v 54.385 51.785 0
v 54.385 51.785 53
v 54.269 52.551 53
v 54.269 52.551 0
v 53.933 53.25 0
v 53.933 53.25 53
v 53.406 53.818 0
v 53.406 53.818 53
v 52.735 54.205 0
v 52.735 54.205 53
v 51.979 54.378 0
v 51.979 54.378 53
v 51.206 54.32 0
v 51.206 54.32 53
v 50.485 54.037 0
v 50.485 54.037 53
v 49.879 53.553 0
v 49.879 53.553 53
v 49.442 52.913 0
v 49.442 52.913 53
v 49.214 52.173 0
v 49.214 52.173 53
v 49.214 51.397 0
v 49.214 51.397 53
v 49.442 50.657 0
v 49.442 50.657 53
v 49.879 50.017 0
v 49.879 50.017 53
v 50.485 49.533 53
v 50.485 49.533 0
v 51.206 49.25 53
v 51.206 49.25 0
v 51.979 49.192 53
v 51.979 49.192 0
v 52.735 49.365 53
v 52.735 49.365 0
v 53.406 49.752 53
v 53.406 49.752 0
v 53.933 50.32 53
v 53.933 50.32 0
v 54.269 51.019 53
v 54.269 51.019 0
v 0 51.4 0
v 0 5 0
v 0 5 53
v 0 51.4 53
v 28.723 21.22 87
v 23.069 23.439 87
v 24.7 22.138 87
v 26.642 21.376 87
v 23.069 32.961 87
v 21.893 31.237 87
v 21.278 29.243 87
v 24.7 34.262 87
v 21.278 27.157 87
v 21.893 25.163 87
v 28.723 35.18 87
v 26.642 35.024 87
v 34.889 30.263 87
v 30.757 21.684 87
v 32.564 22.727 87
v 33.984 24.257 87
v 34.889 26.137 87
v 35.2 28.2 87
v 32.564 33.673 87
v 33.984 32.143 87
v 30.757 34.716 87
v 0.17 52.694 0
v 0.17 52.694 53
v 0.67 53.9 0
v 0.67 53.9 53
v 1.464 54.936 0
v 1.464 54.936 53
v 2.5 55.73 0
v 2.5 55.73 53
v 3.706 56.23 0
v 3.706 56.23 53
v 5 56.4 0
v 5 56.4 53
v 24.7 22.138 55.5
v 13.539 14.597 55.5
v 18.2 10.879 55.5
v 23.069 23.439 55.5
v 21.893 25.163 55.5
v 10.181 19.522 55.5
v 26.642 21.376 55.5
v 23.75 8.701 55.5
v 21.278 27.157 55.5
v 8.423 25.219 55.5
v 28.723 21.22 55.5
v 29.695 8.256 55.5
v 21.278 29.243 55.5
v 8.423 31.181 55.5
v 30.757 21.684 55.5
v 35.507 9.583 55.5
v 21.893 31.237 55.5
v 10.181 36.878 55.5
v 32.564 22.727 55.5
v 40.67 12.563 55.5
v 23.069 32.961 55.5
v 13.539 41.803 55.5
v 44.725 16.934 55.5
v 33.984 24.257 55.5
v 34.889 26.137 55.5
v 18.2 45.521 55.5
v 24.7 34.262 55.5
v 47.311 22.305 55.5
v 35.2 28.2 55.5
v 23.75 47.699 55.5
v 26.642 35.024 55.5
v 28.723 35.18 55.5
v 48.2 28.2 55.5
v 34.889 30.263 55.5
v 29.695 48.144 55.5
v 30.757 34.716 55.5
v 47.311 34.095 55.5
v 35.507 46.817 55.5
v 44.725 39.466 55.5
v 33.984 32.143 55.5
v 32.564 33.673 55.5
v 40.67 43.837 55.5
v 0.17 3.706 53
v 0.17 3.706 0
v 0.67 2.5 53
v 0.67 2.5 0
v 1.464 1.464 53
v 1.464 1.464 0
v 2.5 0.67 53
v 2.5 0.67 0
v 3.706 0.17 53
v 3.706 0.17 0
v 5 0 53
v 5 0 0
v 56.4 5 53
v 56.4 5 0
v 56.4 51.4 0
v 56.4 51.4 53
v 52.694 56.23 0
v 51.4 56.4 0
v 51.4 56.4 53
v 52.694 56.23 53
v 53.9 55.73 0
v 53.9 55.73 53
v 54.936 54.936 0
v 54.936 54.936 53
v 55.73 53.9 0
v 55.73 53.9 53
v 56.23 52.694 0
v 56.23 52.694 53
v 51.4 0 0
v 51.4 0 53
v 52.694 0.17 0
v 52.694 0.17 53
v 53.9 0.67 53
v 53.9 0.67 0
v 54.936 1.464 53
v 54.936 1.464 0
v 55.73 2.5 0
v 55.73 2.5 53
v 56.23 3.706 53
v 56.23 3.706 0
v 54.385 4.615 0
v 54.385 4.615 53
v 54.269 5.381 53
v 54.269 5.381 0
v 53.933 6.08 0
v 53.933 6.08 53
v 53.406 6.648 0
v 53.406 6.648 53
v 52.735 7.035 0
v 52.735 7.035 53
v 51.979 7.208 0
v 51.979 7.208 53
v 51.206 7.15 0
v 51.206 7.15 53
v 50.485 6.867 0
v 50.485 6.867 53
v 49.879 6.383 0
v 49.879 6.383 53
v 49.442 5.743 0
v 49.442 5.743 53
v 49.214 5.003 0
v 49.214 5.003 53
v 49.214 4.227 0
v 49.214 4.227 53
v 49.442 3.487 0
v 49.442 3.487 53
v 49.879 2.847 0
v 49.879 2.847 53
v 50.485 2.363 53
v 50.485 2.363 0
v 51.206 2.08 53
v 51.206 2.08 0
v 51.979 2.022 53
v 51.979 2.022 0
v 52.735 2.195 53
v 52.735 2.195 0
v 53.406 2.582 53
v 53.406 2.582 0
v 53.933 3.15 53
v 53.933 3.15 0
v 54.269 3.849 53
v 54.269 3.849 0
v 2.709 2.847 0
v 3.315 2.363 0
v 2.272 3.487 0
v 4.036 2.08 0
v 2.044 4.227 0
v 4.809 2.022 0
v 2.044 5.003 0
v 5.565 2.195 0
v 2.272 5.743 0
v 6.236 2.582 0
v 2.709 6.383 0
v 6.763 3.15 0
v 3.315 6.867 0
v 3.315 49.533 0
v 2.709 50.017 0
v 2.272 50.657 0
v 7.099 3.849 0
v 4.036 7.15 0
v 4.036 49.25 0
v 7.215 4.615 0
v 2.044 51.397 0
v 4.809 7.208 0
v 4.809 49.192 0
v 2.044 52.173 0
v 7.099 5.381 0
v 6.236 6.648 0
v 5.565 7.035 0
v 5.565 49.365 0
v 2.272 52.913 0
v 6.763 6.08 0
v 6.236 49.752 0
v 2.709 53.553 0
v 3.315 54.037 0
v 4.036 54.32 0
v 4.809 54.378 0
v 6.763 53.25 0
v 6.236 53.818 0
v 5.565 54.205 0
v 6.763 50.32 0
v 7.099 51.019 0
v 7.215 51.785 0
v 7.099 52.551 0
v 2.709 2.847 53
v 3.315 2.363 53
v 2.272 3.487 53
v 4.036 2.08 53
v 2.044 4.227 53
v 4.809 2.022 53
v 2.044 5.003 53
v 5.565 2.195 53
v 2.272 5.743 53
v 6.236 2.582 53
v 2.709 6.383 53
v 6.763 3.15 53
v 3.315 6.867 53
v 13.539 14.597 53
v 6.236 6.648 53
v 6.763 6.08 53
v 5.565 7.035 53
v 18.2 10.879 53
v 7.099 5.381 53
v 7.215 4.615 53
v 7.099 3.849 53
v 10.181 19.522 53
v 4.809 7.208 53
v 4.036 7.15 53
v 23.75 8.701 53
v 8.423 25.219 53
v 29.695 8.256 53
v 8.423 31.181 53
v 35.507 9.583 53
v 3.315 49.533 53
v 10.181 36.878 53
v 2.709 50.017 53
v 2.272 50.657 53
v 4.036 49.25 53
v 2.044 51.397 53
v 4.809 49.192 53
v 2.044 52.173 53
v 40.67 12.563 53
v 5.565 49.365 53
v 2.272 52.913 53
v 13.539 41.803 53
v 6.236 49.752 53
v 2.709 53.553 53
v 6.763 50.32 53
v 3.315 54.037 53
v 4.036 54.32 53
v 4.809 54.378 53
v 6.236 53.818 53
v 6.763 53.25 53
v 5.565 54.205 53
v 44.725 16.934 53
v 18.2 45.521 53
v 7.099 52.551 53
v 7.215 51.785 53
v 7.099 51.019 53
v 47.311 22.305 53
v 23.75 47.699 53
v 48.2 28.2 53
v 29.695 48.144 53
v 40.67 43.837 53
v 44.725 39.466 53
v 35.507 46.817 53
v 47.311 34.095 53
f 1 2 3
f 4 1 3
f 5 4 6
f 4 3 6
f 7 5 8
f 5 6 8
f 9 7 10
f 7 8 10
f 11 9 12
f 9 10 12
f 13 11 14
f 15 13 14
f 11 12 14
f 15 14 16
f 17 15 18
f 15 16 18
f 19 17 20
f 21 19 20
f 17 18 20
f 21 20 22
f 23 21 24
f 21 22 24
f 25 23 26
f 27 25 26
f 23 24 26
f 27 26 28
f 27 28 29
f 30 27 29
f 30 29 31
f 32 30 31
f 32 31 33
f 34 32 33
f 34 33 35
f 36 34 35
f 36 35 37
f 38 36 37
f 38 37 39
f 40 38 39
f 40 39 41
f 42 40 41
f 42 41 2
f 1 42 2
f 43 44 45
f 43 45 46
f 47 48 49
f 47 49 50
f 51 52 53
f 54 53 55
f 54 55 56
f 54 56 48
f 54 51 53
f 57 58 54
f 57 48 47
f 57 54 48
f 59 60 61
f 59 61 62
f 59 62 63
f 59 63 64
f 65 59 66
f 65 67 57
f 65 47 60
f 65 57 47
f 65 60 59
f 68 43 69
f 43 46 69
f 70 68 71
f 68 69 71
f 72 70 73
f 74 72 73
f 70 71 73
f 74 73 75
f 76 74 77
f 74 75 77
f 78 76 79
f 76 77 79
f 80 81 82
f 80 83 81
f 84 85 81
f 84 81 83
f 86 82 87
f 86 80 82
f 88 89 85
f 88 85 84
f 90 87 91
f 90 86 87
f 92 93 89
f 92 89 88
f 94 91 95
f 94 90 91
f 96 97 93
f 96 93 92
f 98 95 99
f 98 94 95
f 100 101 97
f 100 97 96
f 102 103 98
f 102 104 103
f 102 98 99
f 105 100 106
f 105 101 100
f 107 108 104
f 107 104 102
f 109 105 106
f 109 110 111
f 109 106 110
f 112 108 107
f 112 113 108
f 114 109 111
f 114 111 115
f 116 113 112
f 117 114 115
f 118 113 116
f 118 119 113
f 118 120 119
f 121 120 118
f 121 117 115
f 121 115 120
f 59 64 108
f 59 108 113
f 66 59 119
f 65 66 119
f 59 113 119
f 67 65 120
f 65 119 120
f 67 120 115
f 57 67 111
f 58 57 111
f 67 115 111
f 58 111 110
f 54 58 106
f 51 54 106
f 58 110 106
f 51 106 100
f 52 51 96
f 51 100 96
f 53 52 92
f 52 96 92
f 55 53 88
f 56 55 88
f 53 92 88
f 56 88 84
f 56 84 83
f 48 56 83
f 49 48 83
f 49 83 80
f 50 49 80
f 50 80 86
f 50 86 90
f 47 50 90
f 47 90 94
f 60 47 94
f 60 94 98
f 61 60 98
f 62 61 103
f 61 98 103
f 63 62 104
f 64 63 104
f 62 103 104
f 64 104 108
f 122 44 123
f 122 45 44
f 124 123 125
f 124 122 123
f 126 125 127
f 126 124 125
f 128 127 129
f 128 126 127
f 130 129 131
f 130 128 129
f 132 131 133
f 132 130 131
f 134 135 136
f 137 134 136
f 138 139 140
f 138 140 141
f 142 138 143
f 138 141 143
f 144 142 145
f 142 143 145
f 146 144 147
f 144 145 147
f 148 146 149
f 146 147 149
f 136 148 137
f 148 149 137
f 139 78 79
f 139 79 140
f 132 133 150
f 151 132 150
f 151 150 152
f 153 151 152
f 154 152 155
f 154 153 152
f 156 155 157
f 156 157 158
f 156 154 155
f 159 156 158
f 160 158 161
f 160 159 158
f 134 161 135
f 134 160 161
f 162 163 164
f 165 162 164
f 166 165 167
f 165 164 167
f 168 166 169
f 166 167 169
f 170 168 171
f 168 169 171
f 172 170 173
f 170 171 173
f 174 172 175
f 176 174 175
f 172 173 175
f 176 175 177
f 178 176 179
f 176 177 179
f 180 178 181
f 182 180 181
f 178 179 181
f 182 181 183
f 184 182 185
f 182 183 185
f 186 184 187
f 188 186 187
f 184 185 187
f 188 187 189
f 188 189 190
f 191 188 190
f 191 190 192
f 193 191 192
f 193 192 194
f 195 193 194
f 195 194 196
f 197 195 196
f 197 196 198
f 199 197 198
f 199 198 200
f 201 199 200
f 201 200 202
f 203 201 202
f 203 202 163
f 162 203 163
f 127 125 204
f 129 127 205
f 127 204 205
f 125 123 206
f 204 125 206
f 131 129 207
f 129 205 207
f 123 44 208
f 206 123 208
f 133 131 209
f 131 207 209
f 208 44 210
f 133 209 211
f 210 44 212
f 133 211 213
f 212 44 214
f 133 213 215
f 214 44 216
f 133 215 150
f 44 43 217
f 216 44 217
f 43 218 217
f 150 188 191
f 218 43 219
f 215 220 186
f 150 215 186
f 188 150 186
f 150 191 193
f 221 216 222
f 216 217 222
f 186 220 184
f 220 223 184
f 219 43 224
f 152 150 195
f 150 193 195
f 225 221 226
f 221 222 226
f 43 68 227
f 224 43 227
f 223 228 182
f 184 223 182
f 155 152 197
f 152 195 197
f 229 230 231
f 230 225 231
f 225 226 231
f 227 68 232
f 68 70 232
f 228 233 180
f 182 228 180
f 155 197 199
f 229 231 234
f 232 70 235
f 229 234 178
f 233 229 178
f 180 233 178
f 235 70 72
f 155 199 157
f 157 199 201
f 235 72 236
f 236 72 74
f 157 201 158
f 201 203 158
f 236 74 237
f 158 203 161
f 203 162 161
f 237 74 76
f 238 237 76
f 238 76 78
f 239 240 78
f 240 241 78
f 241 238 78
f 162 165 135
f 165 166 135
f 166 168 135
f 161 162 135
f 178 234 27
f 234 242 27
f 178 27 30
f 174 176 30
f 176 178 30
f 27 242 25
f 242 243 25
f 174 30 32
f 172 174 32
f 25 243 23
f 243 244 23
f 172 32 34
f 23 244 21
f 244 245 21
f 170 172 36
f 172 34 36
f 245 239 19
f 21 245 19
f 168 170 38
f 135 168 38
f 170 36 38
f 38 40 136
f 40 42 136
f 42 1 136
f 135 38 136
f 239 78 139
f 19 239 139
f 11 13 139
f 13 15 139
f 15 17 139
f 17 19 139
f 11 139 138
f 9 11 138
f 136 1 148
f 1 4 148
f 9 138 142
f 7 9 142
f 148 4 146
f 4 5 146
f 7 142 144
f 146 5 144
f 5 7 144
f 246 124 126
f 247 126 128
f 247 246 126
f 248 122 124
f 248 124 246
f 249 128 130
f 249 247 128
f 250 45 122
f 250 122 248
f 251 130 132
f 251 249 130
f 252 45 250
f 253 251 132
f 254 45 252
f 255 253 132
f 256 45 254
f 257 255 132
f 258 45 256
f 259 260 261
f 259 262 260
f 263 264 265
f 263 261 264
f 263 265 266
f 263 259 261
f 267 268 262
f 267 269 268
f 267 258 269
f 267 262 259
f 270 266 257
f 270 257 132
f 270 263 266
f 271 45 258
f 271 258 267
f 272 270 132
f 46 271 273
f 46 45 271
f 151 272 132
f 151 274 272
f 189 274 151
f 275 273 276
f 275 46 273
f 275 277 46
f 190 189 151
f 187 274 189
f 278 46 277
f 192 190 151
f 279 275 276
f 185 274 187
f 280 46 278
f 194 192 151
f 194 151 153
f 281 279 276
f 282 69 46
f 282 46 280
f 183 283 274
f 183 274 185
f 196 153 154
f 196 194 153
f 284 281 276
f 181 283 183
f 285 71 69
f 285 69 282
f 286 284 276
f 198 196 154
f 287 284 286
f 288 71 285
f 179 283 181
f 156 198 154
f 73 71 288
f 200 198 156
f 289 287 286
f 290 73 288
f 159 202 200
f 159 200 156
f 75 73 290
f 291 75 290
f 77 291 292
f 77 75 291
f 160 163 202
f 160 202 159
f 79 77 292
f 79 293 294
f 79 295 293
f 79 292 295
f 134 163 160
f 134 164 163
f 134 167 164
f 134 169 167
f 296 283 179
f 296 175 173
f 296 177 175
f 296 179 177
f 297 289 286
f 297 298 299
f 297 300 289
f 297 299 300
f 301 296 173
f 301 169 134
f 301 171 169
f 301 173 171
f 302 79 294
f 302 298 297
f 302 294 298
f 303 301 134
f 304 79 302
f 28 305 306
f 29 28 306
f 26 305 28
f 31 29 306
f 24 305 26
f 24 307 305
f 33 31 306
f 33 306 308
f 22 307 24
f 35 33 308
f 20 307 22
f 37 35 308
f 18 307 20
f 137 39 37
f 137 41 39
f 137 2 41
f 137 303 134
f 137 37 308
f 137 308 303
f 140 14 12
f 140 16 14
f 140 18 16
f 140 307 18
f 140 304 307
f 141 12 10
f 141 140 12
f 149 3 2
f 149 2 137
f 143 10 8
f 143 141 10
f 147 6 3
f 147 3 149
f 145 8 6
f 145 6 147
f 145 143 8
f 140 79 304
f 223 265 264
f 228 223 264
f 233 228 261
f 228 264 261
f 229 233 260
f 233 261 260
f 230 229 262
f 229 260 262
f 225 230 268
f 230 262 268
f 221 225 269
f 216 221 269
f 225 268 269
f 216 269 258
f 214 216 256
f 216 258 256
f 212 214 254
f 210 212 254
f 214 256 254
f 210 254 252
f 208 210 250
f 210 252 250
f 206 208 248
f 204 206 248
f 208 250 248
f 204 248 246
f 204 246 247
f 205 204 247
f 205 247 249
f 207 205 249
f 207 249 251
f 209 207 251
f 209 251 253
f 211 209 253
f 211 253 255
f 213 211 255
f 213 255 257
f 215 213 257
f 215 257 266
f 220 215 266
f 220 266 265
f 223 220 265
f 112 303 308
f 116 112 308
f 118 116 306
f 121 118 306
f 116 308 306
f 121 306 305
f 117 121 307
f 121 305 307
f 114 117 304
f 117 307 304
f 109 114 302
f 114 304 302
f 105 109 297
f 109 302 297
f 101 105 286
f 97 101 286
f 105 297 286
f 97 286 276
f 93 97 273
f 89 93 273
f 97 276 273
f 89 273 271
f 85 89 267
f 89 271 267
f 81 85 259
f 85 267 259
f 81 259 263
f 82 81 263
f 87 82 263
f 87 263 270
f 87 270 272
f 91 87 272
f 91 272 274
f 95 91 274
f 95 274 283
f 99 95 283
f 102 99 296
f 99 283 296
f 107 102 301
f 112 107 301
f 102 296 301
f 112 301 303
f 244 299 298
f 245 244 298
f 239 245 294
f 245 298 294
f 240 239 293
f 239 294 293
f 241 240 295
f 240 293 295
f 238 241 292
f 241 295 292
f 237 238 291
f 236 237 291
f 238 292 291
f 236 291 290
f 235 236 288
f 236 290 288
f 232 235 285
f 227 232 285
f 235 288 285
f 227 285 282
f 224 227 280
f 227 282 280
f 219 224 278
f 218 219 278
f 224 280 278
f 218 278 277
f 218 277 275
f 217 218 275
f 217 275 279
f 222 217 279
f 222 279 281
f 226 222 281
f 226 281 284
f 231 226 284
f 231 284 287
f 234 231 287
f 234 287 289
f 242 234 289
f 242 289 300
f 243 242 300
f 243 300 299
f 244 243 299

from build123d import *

# Parameters (mm, degrees)
SKETCH_1_W          = 56.4
SKETCH_1_H          = 56.4
EXTRUDE_1_DEPTH     = 53
SKETCH_2_R          = 20
EXTRUDE_2_DEPTH     = 2.5
SKETCH_3_R          = 7
EXTRUDE_3_DEPTH     = 31.5
FILLET_1_R          = 5
SKETCH_4_R          = 2.6
CUT_EXTRUDE_1_DEPTH = 54


with BuildPart() as part:
    # 草图1 → 凸台-拉伸1 (new body)
    with BuildSketch(Plane.XY):
        with Locations((28.2, 28.2)):
            Rectangle(SKETCH_1_W, SKETCH_1_H)
    extrude(amount=EXTRUDE_1_DEPTH)

    # 草图2 → 凸台-拉伸2 (add)
    with BuildSketch(Plane.XY.offset(53)):
        with Locations((28.2, 28.2)):
            Circle(SKETCH_2_R)
    extrude(amount=EXTRUDE_2_DEPTH)

    # 草图3 → 凸台-拉伸3 (add)
    with BuildSketch(Plane.XY.offset(55.5)):
        with Locations((28.2, 28.2)):
            Circle(SKETCH_3_R)
    extrude(amount=EXTRUDE_3_DEPTH)

    # 圆角1
    fillet_1_edges = [part.edges().sort_by_distance(p)[0] for p in [
        (0, 56.4, 26.5),
        (56.4, 56.4, 26.5),
        (56.4, 0, 26.5),
        (0, 0, 26.5),
    ]]
    fillet(fillet_1_edges, radius=FILLET_1_R)

    # 草图4 → 切除-拉伸1 (cut, through all)
    with BuildSketch(Plane.XY.offset(53)):
        with Locations((4.615, 51.785)):
            Circle(SKETCH_4_R)
        with Locations((51.785, 51.785)):
            Circle(SKETCH_4_R)
        with Locations((51.785, 4.615)):
            Circle(SKETCH_4_R)
        with Locations((4.615, 4.615)):
            Circle(SKETCH_4_R)
    extrude(amount=-CUT_EXTRUDE_1_DEPTH, mode=Mode.SUBTRACT)


solid = part.part
